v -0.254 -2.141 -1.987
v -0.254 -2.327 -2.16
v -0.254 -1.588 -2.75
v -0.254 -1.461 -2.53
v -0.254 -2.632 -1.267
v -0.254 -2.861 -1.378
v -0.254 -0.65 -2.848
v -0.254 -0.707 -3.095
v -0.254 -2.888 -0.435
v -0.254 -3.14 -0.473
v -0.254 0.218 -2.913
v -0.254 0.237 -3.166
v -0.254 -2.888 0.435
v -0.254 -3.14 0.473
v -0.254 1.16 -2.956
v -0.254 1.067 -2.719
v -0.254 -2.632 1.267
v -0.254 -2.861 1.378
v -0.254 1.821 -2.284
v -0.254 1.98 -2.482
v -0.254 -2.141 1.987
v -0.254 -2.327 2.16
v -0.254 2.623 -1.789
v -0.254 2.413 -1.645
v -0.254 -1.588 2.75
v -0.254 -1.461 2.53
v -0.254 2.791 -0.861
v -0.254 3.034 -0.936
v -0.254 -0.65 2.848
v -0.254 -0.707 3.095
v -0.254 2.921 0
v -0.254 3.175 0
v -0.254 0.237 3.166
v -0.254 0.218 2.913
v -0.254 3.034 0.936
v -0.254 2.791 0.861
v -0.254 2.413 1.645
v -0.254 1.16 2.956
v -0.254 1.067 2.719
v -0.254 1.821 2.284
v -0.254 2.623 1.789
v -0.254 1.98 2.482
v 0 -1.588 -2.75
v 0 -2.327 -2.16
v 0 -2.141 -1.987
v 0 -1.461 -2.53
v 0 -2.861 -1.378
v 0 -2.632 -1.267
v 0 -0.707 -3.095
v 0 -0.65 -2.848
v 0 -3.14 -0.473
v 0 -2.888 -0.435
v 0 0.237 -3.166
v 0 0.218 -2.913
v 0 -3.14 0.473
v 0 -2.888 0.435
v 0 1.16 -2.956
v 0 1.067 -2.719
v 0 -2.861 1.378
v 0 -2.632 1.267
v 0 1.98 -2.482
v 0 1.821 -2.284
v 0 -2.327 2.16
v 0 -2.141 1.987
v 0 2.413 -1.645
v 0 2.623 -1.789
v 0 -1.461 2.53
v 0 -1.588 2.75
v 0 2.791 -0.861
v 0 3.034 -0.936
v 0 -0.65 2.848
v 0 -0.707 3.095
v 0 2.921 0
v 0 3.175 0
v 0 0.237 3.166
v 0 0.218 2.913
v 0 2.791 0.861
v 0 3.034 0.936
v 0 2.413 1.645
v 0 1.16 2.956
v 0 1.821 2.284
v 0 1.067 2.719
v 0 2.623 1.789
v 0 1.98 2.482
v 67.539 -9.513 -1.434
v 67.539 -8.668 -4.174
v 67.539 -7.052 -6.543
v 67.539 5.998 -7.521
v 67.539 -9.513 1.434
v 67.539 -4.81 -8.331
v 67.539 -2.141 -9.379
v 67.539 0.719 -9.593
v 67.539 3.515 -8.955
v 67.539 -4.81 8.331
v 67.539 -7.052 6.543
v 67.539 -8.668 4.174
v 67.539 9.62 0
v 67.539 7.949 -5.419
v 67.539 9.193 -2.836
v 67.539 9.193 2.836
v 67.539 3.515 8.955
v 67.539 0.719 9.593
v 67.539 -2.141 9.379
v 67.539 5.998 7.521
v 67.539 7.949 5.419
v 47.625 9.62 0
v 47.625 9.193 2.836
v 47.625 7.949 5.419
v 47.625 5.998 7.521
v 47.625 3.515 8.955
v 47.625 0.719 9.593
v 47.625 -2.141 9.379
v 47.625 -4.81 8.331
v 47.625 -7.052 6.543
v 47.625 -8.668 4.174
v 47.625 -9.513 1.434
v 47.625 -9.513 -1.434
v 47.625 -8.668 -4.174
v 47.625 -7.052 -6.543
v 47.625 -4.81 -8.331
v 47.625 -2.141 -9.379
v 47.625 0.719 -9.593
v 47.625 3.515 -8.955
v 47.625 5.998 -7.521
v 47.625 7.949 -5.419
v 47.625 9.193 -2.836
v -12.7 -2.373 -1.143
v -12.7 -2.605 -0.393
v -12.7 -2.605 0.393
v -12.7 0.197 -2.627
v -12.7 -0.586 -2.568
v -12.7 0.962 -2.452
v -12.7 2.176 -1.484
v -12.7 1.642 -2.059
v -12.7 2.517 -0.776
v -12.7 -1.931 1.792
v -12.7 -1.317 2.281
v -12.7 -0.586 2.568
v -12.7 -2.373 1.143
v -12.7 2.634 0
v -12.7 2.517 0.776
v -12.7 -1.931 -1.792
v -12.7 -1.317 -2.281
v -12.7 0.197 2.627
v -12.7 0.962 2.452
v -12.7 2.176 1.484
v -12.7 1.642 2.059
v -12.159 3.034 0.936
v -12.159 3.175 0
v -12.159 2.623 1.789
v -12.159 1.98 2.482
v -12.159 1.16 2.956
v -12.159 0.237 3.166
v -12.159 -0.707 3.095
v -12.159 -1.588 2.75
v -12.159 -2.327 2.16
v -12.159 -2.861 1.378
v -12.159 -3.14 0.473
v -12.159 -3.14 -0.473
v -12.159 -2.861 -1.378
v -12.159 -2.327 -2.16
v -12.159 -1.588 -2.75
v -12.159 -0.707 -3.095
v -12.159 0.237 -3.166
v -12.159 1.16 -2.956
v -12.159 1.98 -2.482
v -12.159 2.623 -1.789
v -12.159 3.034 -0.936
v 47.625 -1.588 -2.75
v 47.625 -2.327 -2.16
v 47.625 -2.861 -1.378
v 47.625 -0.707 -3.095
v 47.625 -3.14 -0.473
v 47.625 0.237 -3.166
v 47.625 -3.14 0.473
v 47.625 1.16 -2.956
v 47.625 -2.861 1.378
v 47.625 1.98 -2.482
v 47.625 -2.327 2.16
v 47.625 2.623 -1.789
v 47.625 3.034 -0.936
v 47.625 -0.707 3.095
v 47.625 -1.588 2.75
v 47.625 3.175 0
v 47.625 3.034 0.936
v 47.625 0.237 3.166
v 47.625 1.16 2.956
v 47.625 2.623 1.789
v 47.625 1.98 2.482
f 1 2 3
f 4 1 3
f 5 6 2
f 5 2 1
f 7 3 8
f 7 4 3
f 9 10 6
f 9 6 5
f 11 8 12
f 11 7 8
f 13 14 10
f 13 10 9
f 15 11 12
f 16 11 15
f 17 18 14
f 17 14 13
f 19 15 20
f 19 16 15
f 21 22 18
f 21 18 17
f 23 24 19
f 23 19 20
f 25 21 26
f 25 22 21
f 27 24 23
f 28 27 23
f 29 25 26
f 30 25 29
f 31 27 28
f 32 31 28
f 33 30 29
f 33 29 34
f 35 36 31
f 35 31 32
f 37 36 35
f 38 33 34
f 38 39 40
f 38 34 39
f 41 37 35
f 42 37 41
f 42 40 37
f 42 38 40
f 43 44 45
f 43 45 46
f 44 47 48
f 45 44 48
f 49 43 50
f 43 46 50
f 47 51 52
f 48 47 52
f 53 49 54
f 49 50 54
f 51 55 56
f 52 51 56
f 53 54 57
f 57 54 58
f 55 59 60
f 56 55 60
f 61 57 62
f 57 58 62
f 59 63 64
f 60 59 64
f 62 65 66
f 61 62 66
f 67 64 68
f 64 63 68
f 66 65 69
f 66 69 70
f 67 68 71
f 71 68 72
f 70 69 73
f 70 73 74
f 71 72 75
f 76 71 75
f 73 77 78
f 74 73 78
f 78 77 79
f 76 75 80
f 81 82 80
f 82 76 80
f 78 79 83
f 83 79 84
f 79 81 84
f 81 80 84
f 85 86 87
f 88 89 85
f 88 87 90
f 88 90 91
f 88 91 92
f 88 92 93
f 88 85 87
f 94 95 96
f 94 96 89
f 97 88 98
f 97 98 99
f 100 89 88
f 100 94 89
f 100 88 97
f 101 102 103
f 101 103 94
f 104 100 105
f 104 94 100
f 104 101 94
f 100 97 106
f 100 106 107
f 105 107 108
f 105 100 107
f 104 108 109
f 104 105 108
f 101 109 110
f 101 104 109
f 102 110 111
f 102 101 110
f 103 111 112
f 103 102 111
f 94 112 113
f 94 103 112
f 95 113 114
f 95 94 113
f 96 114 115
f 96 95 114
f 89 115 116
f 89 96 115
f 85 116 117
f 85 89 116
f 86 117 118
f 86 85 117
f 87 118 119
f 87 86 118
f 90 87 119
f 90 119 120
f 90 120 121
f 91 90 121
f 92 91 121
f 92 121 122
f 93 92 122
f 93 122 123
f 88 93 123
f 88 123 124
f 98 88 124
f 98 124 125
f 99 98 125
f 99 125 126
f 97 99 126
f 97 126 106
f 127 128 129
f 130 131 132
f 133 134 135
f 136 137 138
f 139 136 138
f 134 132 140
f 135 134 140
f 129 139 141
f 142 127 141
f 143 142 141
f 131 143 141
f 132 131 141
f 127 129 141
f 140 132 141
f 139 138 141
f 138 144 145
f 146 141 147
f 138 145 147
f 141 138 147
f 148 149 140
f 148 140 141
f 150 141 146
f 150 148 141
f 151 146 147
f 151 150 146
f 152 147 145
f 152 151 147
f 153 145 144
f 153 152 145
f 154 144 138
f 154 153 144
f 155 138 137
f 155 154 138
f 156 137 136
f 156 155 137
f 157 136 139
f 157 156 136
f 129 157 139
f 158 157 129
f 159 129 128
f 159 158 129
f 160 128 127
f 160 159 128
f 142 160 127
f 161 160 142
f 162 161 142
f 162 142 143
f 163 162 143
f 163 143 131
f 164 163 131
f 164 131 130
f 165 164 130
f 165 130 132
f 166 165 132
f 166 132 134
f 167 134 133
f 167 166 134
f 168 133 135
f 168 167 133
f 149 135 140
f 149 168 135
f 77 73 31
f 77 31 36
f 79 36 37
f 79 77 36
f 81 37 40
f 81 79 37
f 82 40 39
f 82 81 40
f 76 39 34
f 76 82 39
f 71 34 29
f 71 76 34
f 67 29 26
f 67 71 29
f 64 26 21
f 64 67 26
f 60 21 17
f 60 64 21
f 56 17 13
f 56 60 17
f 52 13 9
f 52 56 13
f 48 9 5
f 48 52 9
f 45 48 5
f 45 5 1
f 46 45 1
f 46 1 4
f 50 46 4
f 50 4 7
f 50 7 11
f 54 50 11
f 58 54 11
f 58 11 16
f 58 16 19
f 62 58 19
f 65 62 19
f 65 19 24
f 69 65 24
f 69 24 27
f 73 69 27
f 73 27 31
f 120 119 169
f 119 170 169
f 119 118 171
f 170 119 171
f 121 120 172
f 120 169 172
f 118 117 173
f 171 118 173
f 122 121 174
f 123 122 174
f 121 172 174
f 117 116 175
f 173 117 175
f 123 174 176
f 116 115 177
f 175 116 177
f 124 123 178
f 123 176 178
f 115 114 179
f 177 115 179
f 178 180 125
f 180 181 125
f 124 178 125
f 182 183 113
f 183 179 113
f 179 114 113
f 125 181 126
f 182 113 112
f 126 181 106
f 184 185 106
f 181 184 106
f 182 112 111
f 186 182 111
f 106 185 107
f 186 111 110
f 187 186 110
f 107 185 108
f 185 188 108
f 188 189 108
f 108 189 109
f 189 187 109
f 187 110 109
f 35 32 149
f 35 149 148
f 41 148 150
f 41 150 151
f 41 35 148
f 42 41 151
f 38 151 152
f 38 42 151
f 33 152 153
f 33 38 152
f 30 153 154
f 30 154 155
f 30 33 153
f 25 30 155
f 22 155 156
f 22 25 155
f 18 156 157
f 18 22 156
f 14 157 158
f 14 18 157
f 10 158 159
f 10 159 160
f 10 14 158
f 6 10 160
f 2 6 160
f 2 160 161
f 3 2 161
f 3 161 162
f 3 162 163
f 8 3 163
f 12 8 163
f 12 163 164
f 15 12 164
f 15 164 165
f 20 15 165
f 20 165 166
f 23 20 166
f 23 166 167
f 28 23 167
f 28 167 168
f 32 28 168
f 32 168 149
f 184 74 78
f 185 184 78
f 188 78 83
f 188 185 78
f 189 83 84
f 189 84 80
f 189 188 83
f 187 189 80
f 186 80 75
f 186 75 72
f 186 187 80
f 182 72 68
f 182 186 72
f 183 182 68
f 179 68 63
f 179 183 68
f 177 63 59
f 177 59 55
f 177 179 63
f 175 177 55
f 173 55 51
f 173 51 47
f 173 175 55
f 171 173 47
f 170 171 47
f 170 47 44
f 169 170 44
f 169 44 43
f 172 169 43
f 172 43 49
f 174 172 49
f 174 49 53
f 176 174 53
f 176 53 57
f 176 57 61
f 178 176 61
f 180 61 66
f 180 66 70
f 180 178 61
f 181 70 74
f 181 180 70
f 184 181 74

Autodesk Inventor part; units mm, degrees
sketch "Sketch_1" plane through (0, 0, 0) normal (0, 0, 1) x (1, 0, 0)
  line L0 (67.5386, 0) -> (0, 0)
  line L1 (0, 0) -> (0, 3.175)
  line L2 (0, 3.175) -> (47.625, 3.175)
  line L3 (47.625, 3.175) -> (47.625, 9.6202)
  line L4 (47.625, 9.6202) -> (67.5386, 9.6202)
  line L5 (67.5386, 9.6202) -> (67.5386, 0)
  line L6 (67.5386, 0) -> (0, 0)
revolve "Revolution1" add sketch "Sketch_1" angle 360 about axis through (67.5386, 0, 0) along (1, 0, 0)
sketch "Sketch_3" plane through (0, 0, 0) normal (0, 0, 1) x (1, 0, 0)
  line L0 (0, 0) -> (-12.7, 0)
  line L1 (-12.7, 0) -> (-12.7, 2.634)
  line L2 (-12.7, 2.634) -> (-12.159, 3.175)
  line L3 (-12.159, 3.175) -> (0, 3.175)
  line L4 (0, 3.175) -> (0, 0)
  line L5 (0, 0) -> (-12.7, 0)
revolve "Revolution2" add sketch "Sketch_3" angle 360 about axis through (0, 0, 0) along (1, 0, 0)
sketch "Sketch_30" plane through (0, 0, 0) normal (0, 0, 1) x (1, 0, 0)
  line L0 (0, 0) -> (-0.254, 0)
  line L1 (-0.254, 2.921) -> (0, 2.921)
  line L2 (0, 2.921) -> (0, 3.429)
  line L3 (0, 3.429) -> (-0.254, 3.429)
  line L4 (-0.254, 3.429) -> (-0.254, 2.921)
revolve "Revolution3" cut sketch "Sketch_30" angle 360 about axis through (0, 0, 0) along (1, 0, 0)
ref_plane "dia1_XY" through (0, 3.175, 0) normal (1, 0, 0) x (0, 0, -1)
ref_plane "dia1_YZ" through (0, 3.175, 0) normal (0, 0, -1) x (0, 1, 0)
ref_plane "dia1_ZX" through (0, 3.175, 0) normal (0, 1, 0) x (1, 0, 0)
ref_plane "dia12_XY" through (0, 0, 10.2235) normal (1, 0, 0) x (0, 0, -1)
ref_plane "dia12_YZ" through (0, 0, 10.2235) normal (0, 0, -1) x (0, 1, 0)
ref_plane "dia12_ZX" through (0, 0, 10.2235) normal (0, 1, 0) x (1, 0, 0)
ref_plane "dia2_XY" through (0, -3.175, 0) normal (1, 0, 0) x (0, 0, -1)
ref_plane "dia2_YZ" through (0, -3.175, 0) normal (0, 0, -1) x (0, 1, 0)
ref_plane "dia2_ZX" through (0, -3.175, 0) normal (0, 1, 0) x (1, 0, 0)
ref_plane "dia22_XY" through (0, 0, -10.2235) normal (1, 0, 0) x (0, 0, -1)
ref_plane "dia22_YZ" through (0, 0, -10.2235) normal (0, 0, -1) x (0, 1, 0)
ref_plane "dia22_ZX" through (0, 0, -10.2235) normal (0, 1, 0) x (1, 0, 0)
ref_plane "rl1_XY" through (-12.7, 0, 0) normal (1, 0, 0) x (0, 0, -1)
ref_plane "rl1_YZ" through (-12.7, 0, 0) normal (0, 0, -1) x (0, 1, 0)
ref_plane "rl1_ZX" through (-12.7, 0, 0) normal (0, 1, 0) x (1, 0, 0)
ref_plane "rl2_XY" through (0, 0, 0) normal (1, 0, 0) x (0, 0, -1)
ref_plane "rl2_YZ" through (0, 0, 0) normal (0, 0, -1) x (0, 1, 0)
ref_plane "rl2_ZX" through (0, 0, 0) normal (0, 1, 0) x (1, 0, 0)
ref_plane "rod_cp_XY" through (0, 0, 0) normal (1, 0, 0) x (0, 0, -1)
ref_plane "rod_cp_YZ" through (0, 0, 0) normal (0, 0, -1) x (0, 1, 0)
ref_plane "rod_cp_ZX" through (0, 0, 0) normal (0, 1, 0) x (1, 0, 0)
ref_plane "thd1_XY" through (-12.7, 3.175, 0) normal (1, 0, 0) x (0, 0, -1)
ref_plane "thd1_YZ" through (-12.7, 3.175, 0) normal (0, 0, -1) x (0, 1, 0)
ref_plane "thd1_ZX" through (-12.7, 3.175, 0) normal (0, 1, 0) x (1, 0, 0)
ref_plane "thd2_XY" through (-12.7, -3.175, 0) normal (1, 0, 0) x (0, 0, -1)
ref_plane "thd2_YZ" through (-12.7, -3.175, 0) normal (0, 0, -1) x (0, 1, 0)
ref_plane "thd2_ZX" through (-12.7, -3.175, 0) normal (0, 1, 0) x (1, 0, 0)
ref_plane "to_rod_clevis_XY" through (-16.764, 0, 0) normal (1, 0, 0) x (0, 0, -1)
ref_plane "to_rod_clevis_YZ" through (-16.764, 0, 0) normal (0, 0, -1) x (0, 1, 0)
ref_plane "to_rod_clevis_ZX" through (-16.764, 0, 0) normal (0, 1, 0) x (1, 0, 0)
properties part number "C-0410000_rod"
